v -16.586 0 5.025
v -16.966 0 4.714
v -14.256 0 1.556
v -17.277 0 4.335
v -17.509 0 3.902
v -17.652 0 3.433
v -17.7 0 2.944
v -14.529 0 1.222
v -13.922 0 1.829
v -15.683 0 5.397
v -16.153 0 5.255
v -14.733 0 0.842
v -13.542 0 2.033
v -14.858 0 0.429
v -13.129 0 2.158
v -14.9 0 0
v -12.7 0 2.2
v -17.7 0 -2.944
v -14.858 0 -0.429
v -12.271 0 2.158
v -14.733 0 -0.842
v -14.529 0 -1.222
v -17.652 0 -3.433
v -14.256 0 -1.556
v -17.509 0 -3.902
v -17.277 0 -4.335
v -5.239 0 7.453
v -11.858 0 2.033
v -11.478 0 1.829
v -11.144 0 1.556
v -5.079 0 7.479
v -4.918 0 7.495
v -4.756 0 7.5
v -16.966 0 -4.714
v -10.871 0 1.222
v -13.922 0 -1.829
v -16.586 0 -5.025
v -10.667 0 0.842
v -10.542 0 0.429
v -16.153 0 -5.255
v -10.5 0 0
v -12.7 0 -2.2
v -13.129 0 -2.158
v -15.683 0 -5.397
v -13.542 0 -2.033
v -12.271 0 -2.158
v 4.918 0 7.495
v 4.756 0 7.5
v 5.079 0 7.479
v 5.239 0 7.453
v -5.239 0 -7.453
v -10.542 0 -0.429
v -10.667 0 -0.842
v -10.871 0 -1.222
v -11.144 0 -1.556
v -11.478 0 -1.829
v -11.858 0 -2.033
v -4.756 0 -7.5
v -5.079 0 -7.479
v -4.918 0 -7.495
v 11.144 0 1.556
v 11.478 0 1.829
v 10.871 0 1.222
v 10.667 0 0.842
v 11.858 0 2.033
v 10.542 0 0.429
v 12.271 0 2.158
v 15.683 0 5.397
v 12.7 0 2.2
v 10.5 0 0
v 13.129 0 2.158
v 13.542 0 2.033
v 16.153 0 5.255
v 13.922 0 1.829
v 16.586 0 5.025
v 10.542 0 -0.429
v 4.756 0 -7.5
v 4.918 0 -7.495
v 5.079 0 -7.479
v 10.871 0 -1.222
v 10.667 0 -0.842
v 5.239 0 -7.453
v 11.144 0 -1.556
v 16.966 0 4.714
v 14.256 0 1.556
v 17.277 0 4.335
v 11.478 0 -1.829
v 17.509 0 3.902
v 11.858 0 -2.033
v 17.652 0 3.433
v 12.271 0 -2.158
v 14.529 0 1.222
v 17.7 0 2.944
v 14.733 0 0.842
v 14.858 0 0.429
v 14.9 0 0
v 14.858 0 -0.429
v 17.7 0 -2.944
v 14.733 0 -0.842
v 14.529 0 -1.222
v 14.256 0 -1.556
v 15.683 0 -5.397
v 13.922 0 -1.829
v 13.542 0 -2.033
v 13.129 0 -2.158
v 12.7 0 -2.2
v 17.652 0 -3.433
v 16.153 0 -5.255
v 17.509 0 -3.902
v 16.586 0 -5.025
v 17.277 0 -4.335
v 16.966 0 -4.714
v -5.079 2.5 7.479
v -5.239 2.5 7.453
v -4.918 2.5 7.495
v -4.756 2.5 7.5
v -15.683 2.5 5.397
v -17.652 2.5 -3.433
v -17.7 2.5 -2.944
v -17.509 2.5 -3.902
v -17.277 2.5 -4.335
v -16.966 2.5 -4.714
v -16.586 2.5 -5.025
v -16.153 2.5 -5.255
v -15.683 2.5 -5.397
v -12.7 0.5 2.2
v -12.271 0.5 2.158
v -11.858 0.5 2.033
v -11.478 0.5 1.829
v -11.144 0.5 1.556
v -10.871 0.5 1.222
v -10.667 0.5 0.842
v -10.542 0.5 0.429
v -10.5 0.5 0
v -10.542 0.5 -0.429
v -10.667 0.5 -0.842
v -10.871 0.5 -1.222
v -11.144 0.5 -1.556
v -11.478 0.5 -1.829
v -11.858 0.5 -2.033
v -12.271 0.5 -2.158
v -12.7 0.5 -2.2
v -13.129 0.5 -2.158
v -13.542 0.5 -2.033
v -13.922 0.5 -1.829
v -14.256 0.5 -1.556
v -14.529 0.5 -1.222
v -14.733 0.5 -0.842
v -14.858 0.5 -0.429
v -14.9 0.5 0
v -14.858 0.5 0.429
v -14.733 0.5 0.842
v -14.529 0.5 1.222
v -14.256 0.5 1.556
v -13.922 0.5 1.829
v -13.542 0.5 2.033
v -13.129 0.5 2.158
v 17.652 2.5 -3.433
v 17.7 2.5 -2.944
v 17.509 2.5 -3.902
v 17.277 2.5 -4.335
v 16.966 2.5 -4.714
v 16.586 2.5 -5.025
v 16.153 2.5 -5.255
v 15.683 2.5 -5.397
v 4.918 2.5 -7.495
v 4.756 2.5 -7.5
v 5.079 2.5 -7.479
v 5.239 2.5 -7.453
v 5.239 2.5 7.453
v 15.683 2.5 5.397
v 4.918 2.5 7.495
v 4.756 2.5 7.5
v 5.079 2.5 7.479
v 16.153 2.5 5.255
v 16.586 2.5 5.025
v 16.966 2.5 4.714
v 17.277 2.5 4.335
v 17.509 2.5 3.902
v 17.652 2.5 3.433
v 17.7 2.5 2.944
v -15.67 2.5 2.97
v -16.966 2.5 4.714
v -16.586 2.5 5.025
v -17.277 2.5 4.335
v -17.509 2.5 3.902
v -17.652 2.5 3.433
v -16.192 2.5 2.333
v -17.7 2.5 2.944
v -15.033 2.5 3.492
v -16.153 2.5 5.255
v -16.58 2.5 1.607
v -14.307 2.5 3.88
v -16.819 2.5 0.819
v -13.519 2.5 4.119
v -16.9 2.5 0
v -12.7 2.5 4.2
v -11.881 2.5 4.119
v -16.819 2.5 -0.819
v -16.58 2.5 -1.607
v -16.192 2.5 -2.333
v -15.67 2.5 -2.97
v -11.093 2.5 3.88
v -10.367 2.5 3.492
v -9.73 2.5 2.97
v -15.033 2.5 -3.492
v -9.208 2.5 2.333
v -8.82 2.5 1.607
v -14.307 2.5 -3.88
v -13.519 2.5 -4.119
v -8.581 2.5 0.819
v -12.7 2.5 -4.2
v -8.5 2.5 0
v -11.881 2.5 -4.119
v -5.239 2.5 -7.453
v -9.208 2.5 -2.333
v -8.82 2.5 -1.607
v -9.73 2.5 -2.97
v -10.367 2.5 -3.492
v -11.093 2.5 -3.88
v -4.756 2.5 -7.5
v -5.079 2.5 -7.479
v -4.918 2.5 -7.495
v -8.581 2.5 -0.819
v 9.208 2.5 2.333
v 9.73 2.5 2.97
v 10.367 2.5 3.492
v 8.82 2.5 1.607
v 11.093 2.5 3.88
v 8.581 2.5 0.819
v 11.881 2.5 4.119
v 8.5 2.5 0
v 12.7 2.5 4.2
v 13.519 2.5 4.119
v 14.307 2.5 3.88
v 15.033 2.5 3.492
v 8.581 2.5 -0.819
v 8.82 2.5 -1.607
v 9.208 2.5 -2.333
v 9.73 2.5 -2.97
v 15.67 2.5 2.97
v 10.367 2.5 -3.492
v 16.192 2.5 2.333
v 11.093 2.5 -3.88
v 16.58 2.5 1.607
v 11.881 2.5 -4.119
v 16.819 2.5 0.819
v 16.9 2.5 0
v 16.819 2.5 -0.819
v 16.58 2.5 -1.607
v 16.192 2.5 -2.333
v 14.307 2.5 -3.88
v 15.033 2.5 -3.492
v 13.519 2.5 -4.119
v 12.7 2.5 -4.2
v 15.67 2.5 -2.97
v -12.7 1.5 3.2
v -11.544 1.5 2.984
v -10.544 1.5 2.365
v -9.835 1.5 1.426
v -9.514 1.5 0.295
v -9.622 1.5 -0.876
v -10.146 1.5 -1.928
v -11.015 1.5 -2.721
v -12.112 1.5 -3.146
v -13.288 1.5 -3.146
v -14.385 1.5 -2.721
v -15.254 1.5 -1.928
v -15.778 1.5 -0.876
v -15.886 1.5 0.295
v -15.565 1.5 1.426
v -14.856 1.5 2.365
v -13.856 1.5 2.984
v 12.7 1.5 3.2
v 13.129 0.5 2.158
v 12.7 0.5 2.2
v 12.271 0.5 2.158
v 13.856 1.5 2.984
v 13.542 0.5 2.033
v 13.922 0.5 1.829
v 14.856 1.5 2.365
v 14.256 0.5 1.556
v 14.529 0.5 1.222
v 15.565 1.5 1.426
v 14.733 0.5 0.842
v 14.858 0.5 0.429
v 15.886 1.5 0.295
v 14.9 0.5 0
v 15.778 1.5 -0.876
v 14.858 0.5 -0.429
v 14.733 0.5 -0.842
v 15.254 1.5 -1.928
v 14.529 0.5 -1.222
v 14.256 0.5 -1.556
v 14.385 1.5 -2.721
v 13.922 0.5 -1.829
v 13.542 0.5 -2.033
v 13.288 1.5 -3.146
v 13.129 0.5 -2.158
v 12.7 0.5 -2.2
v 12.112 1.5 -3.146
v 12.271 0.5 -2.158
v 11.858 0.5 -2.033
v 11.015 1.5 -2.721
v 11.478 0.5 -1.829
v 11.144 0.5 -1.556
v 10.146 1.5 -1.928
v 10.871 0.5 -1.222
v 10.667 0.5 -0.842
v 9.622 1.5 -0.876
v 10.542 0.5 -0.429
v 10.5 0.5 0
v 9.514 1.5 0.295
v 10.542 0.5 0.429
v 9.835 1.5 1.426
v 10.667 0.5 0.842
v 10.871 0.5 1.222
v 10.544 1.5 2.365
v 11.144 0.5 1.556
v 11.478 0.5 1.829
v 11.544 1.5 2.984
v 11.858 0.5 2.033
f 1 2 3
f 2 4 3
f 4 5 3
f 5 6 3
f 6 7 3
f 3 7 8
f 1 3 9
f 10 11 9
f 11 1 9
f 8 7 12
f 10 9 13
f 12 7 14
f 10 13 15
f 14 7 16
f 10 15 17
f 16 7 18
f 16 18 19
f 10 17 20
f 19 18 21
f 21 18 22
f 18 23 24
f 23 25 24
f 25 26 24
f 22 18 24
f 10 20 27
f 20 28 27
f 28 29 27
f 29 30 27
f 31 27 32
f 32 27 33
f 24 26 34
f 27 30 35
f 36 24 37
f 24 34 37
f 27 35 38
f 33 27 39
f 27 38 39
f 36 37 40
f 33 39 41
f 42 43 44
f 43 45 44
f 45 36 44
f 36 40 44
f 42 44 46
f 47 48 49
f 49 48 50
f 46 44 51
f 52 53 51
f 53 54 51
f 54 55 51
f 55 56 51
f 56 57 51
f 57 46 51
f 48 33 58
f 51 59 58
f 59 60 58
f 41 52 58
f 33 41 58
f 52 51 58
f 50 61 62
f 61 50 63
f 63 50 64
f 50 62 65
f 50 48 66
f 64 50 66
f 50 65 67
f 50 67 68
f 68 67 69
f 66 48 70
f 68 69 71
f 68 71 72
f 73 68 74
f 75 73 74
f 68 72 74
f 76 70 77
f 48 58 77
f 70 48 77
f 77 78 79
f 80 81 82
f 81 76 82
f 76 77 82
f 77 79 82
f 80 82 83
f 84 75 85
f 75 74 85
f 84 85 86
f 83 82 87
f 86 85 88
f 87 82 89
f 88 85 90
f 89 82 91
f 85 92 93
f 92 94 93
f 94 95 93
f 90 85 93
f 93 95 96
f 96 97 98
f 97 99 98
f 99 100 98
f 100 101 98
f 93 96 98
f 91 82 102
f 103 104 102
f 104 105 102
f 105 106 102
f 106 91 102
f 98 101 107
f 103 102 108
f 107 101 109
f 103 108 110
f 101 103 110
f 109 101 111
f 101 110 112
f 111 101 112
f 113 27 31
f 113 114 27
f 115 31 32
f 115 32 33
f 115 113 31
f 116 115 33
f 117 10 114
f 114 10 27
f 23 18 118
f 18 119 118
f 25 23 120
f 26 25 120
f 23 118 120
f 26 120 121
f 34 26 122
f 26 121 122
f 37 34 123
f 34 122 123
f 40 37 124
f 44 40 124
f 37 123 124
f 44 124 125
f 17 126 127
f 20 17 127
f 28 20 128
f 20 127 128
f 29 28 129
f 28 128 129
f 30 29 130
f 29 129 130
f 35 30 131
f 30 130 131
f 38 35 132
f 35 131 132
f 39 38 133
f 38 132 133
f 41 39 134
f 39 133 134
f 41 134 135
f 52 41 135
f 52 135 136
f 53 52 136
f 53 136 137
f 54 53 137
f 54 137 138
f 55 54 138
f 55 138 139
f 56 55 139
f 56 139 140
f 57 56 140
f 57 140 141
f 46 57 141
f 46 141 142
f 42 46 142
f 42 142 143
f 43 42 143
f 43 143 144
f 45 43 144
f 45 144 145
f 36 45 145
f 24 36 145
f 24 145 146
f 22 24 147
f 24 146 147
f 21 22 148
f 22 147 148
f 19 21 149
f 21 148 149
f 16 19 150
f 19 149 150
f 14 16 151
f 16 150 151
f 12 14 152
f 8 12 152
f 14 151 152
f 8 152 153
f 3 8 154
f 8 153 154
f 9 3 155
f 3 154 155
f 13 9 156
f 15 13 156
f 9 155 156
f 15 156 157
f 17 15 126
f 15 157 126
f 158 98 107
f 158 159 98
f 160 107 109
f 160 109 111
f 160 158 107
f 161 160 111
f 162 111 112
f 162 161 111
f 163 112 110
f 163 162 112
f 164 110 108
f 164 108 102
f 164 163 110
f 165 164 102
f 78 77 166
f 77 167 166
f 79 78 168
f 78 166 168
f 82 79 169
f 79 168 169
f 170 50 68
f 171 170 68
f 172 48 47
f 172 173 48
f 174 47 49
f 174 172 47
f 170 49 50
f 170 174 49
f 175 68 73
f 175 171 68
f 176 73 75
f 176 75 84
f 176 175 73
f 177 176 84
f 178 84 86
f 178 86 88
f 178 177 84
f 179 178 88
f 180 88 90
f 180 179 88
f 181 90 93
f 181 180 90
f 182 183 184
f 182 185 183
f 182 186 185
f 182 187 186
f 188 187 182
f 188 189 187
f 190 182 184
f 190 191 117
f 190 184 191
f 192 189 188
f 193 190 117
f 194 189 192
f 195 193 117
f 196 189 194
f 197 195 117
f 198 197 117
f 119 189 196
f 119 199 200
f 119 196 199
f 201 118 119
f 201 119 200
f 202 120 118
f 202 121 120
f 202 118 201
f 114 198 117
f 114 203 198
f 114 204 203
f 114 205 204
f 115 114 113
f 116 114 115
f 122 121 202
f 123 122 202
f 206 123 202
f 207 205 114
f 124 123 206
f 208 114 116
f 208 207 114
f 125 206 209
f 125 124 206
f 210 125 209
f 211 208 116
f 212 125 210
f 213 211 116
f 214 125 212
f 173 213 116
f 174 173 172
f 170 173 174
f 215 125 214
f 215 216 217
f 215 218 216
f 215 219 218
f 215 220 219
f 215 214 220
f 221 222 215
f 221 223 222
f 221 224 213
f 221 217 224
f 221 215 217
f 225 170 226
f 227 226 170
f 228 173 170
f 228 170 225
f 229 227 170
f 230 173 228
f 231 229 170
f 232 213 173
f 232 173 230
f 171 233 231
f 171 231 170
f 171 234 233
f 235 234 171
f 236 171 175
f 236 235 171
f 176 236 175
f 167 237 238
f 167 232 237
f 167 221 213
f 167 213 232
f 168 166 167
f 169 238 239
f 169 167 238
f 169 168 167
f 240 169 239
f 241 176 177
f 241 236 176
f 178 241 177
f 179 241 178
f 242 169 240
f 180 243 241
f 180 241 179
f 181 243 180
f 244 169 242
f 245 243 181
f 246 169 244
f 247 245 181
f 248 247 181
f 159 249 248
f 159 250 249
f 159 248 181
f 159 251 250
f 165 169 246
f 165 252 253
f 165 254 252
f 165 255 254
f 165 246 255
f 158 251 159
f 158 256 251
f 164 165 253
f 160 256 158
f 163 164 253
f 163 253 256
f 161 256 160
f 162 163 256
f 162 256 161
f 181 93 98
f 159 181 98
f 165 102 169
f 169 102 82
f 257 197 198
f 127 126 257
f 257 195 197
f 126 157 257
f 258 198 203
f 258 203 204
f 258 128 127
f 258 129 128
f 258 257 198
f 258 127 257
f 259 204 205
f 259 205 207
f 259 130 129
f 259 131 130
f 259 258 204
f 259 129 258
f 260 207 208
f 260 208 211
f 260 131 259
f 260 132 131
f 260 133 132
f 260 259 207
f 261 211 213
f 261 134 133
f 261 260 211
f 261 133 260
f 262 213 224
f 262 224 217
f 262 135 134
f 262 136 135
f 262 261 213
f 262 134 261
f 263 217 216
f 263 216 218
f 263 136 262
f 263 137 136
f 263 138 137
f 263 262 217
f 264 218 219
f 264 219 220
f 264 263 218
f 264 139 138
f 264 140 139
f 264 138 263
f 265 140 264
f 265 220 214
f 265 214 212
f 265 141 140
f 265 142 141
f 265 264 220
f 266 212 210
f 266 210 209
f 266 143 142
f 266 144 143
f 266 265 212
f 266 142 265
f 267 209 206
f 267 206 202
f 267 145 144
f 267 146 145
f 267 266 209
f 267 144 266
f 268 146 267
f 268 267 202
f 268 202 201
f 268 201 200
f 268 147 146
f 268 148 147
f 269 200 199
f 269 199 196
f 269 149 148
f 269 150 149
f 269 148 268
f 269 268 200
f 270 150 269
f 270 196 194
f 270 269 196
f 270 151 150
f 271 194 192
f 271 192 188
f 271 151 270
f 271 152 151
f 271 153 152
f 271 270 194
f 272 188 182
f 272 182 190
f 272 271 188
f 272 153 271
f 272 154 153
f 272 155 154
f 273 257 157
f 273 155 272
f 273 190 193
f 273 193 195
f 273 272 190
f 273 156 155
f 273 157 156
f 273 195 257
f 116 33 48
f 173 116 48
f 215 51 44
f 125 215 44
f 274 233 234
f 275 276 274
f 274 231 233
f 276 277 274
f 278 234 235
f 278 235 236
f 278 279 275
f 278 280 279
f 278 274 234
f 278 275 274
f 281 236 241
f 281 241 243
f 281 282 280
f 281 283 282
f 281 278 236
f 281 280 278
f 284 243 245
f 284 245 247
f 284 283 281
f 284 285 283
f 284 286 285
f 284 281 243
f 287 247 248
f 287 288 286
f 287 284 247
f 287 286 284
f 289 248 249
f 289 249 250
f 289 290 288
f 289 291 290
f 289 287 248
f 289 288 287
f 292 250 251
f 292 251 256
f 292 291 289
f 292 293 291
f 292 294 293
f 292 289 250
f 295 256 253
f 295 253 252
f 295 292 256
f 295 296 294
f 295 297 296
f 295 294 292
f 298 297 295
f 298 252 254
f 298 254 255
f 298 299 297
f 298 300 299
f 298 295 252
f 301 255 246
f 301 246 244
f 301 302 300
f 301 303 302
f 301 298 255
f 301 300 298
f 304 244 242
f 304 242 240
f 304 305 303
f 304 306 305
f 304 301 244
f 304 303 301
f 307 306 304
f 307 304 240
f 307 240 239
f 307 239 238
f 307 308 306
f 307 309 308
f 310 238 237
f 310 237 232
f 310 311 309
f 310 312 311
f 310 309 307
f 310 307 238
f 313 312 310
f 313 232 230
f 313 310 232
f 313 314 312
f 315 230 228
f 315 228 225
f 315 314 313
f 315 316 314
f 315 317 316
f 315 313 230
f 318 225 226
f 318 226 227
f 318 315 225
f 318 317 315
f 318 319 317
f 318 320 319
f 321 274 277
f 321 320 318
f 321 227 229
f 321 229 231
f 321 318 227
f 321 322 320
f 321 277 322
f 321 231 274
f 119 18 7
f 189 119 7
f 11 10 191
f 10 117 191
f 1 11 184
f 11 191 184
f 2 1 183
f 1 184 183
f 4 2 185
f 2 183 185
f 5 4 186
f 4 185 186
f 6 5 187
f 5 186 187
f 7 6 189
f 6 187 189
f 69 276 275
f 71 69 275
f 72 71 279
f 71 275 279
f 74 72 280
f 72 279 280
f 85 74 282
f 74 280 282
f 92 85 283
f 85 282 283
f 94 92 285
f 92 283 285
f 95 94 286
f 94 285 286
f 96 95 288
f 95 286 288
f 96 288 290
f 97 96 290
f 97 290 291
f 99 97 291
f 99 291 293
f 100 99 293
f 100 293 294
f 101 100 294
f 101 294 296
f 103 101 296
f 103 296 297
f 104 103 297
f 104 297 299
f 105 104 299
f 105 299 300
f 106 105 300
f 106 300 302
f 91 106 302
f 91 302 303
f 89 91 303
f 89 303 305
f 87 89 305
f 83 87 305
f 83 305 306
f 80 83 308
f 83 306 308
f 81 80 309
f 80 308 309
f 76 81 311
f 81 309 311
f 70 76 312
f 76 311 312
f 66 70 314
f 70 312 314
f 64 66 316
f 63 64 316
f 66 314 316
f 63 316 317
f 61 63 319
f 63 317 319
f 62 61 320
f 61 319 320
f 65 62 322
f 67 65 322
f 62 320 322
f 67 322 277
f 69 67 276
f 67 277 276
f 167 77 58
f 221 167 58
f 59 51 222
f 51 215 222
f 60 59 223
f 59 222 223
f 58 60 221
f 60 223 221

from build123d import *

# Parameters (mm, degrees)
BOSS_EXTRUDE1_DEPTH = 2.5
CUT_EXTRUDE2_REACH  = 21.385
SKETCH2_R           = 2.2
CHAMFER1_SIZE       = 2
FILLET1_R           = 2.5


with BuildPart() as part:
    # Sketch1 → Boss-Extrude1 (new body)
    with BuildSketch(Plane(origin=(0, 0, 0), x_dir=(1, 0, 0), z_dir=(0, 1, 0))):
        Polygon((-17.7, -5), (-5, -7.5), (5, -7.5), (17.7, -5), (17.7, 5), (5, 7.5), (-5, 7.5), (-17.7, 5), align=None)
    extrude(amount=BOSS_EXTRUDE1_DEPTH)

    # Sketch2 → Cut-Extrude2 (cut, up to next)
    with BuildSketch(Plane(origin=(0, 2.5, 0), x_dir=(1, 0, 0), z_dir=(0, 1, 0)), mode=Mode.PRIVATE) as cut_extrude2_sk1:
        with Locations(Location((-12.7, 0, 0), (0, 0, 270))):
            Circle(SKETCH2_R)
    cut_extrude2_tool1 = extrude(cut_extrude2_sk1.sketch, amount=-CUT_EXTRUDE2_REACH, mode=Mode.PRIVATE) & part.part
    # Sketch2 → Cut-Extrude2 (cut, up to next)
    with BuildSketch(Plane(origin=(0, 2.5, 0), x_dir=(1, 0, 0), z_dir=(0, 1, 0)), mode=Mode.PRIVATE) as cut_extrude2_sk2:
        with Locations(Location((12.7, 0, 0), (0, 0, 270))):
            Circle(SKETCH2_R)
    cut_extrude2_tool2 = extrude(cut_extrude2_sk2.sketch, amount=-CUT_EXTRUDE2_REACH, mode=Mode.PRIVATE) & part.part
    add(cut_extrude2_tool1.solids().sort_by_distance((-12.7, 2.5, 0))[0], mode=Mode.SUBTRACT)
    add(cut_extrude2_tool2.solids().sort_by_distance((12.7, 2.5, 0))[0], mode=Mode.SUBTRACT)

    # Chamfer1
    chamfer1_edges = [part.edges().sort_by_distance(p)[0] for p in [
        (-12.7, 2.5, -2.2),
        (12.7, 2.5, -2.2),
    ]]
    chamfer(chamfer1_edges, length=CHAMFER1_SIZE)

    # Fillet1
    fillet1_edges = [part.edges().sort_by_distance(p)[0] for p in [
        (5, 1.25, -7.5),
        (17.7, 1.25, -5),
        (17.7, 1.25, 5),
        (5, 1.25, 7.5),
        (-5, 1.25, 7.5),
        (-17.7, 1.25, 5),
        (-17.7, 1.25, -5),
        (-5, 1.25, -7.5),
    ]]
    fillet(fillet1_edges, radius=FILLET1_R)


solid = part.part
